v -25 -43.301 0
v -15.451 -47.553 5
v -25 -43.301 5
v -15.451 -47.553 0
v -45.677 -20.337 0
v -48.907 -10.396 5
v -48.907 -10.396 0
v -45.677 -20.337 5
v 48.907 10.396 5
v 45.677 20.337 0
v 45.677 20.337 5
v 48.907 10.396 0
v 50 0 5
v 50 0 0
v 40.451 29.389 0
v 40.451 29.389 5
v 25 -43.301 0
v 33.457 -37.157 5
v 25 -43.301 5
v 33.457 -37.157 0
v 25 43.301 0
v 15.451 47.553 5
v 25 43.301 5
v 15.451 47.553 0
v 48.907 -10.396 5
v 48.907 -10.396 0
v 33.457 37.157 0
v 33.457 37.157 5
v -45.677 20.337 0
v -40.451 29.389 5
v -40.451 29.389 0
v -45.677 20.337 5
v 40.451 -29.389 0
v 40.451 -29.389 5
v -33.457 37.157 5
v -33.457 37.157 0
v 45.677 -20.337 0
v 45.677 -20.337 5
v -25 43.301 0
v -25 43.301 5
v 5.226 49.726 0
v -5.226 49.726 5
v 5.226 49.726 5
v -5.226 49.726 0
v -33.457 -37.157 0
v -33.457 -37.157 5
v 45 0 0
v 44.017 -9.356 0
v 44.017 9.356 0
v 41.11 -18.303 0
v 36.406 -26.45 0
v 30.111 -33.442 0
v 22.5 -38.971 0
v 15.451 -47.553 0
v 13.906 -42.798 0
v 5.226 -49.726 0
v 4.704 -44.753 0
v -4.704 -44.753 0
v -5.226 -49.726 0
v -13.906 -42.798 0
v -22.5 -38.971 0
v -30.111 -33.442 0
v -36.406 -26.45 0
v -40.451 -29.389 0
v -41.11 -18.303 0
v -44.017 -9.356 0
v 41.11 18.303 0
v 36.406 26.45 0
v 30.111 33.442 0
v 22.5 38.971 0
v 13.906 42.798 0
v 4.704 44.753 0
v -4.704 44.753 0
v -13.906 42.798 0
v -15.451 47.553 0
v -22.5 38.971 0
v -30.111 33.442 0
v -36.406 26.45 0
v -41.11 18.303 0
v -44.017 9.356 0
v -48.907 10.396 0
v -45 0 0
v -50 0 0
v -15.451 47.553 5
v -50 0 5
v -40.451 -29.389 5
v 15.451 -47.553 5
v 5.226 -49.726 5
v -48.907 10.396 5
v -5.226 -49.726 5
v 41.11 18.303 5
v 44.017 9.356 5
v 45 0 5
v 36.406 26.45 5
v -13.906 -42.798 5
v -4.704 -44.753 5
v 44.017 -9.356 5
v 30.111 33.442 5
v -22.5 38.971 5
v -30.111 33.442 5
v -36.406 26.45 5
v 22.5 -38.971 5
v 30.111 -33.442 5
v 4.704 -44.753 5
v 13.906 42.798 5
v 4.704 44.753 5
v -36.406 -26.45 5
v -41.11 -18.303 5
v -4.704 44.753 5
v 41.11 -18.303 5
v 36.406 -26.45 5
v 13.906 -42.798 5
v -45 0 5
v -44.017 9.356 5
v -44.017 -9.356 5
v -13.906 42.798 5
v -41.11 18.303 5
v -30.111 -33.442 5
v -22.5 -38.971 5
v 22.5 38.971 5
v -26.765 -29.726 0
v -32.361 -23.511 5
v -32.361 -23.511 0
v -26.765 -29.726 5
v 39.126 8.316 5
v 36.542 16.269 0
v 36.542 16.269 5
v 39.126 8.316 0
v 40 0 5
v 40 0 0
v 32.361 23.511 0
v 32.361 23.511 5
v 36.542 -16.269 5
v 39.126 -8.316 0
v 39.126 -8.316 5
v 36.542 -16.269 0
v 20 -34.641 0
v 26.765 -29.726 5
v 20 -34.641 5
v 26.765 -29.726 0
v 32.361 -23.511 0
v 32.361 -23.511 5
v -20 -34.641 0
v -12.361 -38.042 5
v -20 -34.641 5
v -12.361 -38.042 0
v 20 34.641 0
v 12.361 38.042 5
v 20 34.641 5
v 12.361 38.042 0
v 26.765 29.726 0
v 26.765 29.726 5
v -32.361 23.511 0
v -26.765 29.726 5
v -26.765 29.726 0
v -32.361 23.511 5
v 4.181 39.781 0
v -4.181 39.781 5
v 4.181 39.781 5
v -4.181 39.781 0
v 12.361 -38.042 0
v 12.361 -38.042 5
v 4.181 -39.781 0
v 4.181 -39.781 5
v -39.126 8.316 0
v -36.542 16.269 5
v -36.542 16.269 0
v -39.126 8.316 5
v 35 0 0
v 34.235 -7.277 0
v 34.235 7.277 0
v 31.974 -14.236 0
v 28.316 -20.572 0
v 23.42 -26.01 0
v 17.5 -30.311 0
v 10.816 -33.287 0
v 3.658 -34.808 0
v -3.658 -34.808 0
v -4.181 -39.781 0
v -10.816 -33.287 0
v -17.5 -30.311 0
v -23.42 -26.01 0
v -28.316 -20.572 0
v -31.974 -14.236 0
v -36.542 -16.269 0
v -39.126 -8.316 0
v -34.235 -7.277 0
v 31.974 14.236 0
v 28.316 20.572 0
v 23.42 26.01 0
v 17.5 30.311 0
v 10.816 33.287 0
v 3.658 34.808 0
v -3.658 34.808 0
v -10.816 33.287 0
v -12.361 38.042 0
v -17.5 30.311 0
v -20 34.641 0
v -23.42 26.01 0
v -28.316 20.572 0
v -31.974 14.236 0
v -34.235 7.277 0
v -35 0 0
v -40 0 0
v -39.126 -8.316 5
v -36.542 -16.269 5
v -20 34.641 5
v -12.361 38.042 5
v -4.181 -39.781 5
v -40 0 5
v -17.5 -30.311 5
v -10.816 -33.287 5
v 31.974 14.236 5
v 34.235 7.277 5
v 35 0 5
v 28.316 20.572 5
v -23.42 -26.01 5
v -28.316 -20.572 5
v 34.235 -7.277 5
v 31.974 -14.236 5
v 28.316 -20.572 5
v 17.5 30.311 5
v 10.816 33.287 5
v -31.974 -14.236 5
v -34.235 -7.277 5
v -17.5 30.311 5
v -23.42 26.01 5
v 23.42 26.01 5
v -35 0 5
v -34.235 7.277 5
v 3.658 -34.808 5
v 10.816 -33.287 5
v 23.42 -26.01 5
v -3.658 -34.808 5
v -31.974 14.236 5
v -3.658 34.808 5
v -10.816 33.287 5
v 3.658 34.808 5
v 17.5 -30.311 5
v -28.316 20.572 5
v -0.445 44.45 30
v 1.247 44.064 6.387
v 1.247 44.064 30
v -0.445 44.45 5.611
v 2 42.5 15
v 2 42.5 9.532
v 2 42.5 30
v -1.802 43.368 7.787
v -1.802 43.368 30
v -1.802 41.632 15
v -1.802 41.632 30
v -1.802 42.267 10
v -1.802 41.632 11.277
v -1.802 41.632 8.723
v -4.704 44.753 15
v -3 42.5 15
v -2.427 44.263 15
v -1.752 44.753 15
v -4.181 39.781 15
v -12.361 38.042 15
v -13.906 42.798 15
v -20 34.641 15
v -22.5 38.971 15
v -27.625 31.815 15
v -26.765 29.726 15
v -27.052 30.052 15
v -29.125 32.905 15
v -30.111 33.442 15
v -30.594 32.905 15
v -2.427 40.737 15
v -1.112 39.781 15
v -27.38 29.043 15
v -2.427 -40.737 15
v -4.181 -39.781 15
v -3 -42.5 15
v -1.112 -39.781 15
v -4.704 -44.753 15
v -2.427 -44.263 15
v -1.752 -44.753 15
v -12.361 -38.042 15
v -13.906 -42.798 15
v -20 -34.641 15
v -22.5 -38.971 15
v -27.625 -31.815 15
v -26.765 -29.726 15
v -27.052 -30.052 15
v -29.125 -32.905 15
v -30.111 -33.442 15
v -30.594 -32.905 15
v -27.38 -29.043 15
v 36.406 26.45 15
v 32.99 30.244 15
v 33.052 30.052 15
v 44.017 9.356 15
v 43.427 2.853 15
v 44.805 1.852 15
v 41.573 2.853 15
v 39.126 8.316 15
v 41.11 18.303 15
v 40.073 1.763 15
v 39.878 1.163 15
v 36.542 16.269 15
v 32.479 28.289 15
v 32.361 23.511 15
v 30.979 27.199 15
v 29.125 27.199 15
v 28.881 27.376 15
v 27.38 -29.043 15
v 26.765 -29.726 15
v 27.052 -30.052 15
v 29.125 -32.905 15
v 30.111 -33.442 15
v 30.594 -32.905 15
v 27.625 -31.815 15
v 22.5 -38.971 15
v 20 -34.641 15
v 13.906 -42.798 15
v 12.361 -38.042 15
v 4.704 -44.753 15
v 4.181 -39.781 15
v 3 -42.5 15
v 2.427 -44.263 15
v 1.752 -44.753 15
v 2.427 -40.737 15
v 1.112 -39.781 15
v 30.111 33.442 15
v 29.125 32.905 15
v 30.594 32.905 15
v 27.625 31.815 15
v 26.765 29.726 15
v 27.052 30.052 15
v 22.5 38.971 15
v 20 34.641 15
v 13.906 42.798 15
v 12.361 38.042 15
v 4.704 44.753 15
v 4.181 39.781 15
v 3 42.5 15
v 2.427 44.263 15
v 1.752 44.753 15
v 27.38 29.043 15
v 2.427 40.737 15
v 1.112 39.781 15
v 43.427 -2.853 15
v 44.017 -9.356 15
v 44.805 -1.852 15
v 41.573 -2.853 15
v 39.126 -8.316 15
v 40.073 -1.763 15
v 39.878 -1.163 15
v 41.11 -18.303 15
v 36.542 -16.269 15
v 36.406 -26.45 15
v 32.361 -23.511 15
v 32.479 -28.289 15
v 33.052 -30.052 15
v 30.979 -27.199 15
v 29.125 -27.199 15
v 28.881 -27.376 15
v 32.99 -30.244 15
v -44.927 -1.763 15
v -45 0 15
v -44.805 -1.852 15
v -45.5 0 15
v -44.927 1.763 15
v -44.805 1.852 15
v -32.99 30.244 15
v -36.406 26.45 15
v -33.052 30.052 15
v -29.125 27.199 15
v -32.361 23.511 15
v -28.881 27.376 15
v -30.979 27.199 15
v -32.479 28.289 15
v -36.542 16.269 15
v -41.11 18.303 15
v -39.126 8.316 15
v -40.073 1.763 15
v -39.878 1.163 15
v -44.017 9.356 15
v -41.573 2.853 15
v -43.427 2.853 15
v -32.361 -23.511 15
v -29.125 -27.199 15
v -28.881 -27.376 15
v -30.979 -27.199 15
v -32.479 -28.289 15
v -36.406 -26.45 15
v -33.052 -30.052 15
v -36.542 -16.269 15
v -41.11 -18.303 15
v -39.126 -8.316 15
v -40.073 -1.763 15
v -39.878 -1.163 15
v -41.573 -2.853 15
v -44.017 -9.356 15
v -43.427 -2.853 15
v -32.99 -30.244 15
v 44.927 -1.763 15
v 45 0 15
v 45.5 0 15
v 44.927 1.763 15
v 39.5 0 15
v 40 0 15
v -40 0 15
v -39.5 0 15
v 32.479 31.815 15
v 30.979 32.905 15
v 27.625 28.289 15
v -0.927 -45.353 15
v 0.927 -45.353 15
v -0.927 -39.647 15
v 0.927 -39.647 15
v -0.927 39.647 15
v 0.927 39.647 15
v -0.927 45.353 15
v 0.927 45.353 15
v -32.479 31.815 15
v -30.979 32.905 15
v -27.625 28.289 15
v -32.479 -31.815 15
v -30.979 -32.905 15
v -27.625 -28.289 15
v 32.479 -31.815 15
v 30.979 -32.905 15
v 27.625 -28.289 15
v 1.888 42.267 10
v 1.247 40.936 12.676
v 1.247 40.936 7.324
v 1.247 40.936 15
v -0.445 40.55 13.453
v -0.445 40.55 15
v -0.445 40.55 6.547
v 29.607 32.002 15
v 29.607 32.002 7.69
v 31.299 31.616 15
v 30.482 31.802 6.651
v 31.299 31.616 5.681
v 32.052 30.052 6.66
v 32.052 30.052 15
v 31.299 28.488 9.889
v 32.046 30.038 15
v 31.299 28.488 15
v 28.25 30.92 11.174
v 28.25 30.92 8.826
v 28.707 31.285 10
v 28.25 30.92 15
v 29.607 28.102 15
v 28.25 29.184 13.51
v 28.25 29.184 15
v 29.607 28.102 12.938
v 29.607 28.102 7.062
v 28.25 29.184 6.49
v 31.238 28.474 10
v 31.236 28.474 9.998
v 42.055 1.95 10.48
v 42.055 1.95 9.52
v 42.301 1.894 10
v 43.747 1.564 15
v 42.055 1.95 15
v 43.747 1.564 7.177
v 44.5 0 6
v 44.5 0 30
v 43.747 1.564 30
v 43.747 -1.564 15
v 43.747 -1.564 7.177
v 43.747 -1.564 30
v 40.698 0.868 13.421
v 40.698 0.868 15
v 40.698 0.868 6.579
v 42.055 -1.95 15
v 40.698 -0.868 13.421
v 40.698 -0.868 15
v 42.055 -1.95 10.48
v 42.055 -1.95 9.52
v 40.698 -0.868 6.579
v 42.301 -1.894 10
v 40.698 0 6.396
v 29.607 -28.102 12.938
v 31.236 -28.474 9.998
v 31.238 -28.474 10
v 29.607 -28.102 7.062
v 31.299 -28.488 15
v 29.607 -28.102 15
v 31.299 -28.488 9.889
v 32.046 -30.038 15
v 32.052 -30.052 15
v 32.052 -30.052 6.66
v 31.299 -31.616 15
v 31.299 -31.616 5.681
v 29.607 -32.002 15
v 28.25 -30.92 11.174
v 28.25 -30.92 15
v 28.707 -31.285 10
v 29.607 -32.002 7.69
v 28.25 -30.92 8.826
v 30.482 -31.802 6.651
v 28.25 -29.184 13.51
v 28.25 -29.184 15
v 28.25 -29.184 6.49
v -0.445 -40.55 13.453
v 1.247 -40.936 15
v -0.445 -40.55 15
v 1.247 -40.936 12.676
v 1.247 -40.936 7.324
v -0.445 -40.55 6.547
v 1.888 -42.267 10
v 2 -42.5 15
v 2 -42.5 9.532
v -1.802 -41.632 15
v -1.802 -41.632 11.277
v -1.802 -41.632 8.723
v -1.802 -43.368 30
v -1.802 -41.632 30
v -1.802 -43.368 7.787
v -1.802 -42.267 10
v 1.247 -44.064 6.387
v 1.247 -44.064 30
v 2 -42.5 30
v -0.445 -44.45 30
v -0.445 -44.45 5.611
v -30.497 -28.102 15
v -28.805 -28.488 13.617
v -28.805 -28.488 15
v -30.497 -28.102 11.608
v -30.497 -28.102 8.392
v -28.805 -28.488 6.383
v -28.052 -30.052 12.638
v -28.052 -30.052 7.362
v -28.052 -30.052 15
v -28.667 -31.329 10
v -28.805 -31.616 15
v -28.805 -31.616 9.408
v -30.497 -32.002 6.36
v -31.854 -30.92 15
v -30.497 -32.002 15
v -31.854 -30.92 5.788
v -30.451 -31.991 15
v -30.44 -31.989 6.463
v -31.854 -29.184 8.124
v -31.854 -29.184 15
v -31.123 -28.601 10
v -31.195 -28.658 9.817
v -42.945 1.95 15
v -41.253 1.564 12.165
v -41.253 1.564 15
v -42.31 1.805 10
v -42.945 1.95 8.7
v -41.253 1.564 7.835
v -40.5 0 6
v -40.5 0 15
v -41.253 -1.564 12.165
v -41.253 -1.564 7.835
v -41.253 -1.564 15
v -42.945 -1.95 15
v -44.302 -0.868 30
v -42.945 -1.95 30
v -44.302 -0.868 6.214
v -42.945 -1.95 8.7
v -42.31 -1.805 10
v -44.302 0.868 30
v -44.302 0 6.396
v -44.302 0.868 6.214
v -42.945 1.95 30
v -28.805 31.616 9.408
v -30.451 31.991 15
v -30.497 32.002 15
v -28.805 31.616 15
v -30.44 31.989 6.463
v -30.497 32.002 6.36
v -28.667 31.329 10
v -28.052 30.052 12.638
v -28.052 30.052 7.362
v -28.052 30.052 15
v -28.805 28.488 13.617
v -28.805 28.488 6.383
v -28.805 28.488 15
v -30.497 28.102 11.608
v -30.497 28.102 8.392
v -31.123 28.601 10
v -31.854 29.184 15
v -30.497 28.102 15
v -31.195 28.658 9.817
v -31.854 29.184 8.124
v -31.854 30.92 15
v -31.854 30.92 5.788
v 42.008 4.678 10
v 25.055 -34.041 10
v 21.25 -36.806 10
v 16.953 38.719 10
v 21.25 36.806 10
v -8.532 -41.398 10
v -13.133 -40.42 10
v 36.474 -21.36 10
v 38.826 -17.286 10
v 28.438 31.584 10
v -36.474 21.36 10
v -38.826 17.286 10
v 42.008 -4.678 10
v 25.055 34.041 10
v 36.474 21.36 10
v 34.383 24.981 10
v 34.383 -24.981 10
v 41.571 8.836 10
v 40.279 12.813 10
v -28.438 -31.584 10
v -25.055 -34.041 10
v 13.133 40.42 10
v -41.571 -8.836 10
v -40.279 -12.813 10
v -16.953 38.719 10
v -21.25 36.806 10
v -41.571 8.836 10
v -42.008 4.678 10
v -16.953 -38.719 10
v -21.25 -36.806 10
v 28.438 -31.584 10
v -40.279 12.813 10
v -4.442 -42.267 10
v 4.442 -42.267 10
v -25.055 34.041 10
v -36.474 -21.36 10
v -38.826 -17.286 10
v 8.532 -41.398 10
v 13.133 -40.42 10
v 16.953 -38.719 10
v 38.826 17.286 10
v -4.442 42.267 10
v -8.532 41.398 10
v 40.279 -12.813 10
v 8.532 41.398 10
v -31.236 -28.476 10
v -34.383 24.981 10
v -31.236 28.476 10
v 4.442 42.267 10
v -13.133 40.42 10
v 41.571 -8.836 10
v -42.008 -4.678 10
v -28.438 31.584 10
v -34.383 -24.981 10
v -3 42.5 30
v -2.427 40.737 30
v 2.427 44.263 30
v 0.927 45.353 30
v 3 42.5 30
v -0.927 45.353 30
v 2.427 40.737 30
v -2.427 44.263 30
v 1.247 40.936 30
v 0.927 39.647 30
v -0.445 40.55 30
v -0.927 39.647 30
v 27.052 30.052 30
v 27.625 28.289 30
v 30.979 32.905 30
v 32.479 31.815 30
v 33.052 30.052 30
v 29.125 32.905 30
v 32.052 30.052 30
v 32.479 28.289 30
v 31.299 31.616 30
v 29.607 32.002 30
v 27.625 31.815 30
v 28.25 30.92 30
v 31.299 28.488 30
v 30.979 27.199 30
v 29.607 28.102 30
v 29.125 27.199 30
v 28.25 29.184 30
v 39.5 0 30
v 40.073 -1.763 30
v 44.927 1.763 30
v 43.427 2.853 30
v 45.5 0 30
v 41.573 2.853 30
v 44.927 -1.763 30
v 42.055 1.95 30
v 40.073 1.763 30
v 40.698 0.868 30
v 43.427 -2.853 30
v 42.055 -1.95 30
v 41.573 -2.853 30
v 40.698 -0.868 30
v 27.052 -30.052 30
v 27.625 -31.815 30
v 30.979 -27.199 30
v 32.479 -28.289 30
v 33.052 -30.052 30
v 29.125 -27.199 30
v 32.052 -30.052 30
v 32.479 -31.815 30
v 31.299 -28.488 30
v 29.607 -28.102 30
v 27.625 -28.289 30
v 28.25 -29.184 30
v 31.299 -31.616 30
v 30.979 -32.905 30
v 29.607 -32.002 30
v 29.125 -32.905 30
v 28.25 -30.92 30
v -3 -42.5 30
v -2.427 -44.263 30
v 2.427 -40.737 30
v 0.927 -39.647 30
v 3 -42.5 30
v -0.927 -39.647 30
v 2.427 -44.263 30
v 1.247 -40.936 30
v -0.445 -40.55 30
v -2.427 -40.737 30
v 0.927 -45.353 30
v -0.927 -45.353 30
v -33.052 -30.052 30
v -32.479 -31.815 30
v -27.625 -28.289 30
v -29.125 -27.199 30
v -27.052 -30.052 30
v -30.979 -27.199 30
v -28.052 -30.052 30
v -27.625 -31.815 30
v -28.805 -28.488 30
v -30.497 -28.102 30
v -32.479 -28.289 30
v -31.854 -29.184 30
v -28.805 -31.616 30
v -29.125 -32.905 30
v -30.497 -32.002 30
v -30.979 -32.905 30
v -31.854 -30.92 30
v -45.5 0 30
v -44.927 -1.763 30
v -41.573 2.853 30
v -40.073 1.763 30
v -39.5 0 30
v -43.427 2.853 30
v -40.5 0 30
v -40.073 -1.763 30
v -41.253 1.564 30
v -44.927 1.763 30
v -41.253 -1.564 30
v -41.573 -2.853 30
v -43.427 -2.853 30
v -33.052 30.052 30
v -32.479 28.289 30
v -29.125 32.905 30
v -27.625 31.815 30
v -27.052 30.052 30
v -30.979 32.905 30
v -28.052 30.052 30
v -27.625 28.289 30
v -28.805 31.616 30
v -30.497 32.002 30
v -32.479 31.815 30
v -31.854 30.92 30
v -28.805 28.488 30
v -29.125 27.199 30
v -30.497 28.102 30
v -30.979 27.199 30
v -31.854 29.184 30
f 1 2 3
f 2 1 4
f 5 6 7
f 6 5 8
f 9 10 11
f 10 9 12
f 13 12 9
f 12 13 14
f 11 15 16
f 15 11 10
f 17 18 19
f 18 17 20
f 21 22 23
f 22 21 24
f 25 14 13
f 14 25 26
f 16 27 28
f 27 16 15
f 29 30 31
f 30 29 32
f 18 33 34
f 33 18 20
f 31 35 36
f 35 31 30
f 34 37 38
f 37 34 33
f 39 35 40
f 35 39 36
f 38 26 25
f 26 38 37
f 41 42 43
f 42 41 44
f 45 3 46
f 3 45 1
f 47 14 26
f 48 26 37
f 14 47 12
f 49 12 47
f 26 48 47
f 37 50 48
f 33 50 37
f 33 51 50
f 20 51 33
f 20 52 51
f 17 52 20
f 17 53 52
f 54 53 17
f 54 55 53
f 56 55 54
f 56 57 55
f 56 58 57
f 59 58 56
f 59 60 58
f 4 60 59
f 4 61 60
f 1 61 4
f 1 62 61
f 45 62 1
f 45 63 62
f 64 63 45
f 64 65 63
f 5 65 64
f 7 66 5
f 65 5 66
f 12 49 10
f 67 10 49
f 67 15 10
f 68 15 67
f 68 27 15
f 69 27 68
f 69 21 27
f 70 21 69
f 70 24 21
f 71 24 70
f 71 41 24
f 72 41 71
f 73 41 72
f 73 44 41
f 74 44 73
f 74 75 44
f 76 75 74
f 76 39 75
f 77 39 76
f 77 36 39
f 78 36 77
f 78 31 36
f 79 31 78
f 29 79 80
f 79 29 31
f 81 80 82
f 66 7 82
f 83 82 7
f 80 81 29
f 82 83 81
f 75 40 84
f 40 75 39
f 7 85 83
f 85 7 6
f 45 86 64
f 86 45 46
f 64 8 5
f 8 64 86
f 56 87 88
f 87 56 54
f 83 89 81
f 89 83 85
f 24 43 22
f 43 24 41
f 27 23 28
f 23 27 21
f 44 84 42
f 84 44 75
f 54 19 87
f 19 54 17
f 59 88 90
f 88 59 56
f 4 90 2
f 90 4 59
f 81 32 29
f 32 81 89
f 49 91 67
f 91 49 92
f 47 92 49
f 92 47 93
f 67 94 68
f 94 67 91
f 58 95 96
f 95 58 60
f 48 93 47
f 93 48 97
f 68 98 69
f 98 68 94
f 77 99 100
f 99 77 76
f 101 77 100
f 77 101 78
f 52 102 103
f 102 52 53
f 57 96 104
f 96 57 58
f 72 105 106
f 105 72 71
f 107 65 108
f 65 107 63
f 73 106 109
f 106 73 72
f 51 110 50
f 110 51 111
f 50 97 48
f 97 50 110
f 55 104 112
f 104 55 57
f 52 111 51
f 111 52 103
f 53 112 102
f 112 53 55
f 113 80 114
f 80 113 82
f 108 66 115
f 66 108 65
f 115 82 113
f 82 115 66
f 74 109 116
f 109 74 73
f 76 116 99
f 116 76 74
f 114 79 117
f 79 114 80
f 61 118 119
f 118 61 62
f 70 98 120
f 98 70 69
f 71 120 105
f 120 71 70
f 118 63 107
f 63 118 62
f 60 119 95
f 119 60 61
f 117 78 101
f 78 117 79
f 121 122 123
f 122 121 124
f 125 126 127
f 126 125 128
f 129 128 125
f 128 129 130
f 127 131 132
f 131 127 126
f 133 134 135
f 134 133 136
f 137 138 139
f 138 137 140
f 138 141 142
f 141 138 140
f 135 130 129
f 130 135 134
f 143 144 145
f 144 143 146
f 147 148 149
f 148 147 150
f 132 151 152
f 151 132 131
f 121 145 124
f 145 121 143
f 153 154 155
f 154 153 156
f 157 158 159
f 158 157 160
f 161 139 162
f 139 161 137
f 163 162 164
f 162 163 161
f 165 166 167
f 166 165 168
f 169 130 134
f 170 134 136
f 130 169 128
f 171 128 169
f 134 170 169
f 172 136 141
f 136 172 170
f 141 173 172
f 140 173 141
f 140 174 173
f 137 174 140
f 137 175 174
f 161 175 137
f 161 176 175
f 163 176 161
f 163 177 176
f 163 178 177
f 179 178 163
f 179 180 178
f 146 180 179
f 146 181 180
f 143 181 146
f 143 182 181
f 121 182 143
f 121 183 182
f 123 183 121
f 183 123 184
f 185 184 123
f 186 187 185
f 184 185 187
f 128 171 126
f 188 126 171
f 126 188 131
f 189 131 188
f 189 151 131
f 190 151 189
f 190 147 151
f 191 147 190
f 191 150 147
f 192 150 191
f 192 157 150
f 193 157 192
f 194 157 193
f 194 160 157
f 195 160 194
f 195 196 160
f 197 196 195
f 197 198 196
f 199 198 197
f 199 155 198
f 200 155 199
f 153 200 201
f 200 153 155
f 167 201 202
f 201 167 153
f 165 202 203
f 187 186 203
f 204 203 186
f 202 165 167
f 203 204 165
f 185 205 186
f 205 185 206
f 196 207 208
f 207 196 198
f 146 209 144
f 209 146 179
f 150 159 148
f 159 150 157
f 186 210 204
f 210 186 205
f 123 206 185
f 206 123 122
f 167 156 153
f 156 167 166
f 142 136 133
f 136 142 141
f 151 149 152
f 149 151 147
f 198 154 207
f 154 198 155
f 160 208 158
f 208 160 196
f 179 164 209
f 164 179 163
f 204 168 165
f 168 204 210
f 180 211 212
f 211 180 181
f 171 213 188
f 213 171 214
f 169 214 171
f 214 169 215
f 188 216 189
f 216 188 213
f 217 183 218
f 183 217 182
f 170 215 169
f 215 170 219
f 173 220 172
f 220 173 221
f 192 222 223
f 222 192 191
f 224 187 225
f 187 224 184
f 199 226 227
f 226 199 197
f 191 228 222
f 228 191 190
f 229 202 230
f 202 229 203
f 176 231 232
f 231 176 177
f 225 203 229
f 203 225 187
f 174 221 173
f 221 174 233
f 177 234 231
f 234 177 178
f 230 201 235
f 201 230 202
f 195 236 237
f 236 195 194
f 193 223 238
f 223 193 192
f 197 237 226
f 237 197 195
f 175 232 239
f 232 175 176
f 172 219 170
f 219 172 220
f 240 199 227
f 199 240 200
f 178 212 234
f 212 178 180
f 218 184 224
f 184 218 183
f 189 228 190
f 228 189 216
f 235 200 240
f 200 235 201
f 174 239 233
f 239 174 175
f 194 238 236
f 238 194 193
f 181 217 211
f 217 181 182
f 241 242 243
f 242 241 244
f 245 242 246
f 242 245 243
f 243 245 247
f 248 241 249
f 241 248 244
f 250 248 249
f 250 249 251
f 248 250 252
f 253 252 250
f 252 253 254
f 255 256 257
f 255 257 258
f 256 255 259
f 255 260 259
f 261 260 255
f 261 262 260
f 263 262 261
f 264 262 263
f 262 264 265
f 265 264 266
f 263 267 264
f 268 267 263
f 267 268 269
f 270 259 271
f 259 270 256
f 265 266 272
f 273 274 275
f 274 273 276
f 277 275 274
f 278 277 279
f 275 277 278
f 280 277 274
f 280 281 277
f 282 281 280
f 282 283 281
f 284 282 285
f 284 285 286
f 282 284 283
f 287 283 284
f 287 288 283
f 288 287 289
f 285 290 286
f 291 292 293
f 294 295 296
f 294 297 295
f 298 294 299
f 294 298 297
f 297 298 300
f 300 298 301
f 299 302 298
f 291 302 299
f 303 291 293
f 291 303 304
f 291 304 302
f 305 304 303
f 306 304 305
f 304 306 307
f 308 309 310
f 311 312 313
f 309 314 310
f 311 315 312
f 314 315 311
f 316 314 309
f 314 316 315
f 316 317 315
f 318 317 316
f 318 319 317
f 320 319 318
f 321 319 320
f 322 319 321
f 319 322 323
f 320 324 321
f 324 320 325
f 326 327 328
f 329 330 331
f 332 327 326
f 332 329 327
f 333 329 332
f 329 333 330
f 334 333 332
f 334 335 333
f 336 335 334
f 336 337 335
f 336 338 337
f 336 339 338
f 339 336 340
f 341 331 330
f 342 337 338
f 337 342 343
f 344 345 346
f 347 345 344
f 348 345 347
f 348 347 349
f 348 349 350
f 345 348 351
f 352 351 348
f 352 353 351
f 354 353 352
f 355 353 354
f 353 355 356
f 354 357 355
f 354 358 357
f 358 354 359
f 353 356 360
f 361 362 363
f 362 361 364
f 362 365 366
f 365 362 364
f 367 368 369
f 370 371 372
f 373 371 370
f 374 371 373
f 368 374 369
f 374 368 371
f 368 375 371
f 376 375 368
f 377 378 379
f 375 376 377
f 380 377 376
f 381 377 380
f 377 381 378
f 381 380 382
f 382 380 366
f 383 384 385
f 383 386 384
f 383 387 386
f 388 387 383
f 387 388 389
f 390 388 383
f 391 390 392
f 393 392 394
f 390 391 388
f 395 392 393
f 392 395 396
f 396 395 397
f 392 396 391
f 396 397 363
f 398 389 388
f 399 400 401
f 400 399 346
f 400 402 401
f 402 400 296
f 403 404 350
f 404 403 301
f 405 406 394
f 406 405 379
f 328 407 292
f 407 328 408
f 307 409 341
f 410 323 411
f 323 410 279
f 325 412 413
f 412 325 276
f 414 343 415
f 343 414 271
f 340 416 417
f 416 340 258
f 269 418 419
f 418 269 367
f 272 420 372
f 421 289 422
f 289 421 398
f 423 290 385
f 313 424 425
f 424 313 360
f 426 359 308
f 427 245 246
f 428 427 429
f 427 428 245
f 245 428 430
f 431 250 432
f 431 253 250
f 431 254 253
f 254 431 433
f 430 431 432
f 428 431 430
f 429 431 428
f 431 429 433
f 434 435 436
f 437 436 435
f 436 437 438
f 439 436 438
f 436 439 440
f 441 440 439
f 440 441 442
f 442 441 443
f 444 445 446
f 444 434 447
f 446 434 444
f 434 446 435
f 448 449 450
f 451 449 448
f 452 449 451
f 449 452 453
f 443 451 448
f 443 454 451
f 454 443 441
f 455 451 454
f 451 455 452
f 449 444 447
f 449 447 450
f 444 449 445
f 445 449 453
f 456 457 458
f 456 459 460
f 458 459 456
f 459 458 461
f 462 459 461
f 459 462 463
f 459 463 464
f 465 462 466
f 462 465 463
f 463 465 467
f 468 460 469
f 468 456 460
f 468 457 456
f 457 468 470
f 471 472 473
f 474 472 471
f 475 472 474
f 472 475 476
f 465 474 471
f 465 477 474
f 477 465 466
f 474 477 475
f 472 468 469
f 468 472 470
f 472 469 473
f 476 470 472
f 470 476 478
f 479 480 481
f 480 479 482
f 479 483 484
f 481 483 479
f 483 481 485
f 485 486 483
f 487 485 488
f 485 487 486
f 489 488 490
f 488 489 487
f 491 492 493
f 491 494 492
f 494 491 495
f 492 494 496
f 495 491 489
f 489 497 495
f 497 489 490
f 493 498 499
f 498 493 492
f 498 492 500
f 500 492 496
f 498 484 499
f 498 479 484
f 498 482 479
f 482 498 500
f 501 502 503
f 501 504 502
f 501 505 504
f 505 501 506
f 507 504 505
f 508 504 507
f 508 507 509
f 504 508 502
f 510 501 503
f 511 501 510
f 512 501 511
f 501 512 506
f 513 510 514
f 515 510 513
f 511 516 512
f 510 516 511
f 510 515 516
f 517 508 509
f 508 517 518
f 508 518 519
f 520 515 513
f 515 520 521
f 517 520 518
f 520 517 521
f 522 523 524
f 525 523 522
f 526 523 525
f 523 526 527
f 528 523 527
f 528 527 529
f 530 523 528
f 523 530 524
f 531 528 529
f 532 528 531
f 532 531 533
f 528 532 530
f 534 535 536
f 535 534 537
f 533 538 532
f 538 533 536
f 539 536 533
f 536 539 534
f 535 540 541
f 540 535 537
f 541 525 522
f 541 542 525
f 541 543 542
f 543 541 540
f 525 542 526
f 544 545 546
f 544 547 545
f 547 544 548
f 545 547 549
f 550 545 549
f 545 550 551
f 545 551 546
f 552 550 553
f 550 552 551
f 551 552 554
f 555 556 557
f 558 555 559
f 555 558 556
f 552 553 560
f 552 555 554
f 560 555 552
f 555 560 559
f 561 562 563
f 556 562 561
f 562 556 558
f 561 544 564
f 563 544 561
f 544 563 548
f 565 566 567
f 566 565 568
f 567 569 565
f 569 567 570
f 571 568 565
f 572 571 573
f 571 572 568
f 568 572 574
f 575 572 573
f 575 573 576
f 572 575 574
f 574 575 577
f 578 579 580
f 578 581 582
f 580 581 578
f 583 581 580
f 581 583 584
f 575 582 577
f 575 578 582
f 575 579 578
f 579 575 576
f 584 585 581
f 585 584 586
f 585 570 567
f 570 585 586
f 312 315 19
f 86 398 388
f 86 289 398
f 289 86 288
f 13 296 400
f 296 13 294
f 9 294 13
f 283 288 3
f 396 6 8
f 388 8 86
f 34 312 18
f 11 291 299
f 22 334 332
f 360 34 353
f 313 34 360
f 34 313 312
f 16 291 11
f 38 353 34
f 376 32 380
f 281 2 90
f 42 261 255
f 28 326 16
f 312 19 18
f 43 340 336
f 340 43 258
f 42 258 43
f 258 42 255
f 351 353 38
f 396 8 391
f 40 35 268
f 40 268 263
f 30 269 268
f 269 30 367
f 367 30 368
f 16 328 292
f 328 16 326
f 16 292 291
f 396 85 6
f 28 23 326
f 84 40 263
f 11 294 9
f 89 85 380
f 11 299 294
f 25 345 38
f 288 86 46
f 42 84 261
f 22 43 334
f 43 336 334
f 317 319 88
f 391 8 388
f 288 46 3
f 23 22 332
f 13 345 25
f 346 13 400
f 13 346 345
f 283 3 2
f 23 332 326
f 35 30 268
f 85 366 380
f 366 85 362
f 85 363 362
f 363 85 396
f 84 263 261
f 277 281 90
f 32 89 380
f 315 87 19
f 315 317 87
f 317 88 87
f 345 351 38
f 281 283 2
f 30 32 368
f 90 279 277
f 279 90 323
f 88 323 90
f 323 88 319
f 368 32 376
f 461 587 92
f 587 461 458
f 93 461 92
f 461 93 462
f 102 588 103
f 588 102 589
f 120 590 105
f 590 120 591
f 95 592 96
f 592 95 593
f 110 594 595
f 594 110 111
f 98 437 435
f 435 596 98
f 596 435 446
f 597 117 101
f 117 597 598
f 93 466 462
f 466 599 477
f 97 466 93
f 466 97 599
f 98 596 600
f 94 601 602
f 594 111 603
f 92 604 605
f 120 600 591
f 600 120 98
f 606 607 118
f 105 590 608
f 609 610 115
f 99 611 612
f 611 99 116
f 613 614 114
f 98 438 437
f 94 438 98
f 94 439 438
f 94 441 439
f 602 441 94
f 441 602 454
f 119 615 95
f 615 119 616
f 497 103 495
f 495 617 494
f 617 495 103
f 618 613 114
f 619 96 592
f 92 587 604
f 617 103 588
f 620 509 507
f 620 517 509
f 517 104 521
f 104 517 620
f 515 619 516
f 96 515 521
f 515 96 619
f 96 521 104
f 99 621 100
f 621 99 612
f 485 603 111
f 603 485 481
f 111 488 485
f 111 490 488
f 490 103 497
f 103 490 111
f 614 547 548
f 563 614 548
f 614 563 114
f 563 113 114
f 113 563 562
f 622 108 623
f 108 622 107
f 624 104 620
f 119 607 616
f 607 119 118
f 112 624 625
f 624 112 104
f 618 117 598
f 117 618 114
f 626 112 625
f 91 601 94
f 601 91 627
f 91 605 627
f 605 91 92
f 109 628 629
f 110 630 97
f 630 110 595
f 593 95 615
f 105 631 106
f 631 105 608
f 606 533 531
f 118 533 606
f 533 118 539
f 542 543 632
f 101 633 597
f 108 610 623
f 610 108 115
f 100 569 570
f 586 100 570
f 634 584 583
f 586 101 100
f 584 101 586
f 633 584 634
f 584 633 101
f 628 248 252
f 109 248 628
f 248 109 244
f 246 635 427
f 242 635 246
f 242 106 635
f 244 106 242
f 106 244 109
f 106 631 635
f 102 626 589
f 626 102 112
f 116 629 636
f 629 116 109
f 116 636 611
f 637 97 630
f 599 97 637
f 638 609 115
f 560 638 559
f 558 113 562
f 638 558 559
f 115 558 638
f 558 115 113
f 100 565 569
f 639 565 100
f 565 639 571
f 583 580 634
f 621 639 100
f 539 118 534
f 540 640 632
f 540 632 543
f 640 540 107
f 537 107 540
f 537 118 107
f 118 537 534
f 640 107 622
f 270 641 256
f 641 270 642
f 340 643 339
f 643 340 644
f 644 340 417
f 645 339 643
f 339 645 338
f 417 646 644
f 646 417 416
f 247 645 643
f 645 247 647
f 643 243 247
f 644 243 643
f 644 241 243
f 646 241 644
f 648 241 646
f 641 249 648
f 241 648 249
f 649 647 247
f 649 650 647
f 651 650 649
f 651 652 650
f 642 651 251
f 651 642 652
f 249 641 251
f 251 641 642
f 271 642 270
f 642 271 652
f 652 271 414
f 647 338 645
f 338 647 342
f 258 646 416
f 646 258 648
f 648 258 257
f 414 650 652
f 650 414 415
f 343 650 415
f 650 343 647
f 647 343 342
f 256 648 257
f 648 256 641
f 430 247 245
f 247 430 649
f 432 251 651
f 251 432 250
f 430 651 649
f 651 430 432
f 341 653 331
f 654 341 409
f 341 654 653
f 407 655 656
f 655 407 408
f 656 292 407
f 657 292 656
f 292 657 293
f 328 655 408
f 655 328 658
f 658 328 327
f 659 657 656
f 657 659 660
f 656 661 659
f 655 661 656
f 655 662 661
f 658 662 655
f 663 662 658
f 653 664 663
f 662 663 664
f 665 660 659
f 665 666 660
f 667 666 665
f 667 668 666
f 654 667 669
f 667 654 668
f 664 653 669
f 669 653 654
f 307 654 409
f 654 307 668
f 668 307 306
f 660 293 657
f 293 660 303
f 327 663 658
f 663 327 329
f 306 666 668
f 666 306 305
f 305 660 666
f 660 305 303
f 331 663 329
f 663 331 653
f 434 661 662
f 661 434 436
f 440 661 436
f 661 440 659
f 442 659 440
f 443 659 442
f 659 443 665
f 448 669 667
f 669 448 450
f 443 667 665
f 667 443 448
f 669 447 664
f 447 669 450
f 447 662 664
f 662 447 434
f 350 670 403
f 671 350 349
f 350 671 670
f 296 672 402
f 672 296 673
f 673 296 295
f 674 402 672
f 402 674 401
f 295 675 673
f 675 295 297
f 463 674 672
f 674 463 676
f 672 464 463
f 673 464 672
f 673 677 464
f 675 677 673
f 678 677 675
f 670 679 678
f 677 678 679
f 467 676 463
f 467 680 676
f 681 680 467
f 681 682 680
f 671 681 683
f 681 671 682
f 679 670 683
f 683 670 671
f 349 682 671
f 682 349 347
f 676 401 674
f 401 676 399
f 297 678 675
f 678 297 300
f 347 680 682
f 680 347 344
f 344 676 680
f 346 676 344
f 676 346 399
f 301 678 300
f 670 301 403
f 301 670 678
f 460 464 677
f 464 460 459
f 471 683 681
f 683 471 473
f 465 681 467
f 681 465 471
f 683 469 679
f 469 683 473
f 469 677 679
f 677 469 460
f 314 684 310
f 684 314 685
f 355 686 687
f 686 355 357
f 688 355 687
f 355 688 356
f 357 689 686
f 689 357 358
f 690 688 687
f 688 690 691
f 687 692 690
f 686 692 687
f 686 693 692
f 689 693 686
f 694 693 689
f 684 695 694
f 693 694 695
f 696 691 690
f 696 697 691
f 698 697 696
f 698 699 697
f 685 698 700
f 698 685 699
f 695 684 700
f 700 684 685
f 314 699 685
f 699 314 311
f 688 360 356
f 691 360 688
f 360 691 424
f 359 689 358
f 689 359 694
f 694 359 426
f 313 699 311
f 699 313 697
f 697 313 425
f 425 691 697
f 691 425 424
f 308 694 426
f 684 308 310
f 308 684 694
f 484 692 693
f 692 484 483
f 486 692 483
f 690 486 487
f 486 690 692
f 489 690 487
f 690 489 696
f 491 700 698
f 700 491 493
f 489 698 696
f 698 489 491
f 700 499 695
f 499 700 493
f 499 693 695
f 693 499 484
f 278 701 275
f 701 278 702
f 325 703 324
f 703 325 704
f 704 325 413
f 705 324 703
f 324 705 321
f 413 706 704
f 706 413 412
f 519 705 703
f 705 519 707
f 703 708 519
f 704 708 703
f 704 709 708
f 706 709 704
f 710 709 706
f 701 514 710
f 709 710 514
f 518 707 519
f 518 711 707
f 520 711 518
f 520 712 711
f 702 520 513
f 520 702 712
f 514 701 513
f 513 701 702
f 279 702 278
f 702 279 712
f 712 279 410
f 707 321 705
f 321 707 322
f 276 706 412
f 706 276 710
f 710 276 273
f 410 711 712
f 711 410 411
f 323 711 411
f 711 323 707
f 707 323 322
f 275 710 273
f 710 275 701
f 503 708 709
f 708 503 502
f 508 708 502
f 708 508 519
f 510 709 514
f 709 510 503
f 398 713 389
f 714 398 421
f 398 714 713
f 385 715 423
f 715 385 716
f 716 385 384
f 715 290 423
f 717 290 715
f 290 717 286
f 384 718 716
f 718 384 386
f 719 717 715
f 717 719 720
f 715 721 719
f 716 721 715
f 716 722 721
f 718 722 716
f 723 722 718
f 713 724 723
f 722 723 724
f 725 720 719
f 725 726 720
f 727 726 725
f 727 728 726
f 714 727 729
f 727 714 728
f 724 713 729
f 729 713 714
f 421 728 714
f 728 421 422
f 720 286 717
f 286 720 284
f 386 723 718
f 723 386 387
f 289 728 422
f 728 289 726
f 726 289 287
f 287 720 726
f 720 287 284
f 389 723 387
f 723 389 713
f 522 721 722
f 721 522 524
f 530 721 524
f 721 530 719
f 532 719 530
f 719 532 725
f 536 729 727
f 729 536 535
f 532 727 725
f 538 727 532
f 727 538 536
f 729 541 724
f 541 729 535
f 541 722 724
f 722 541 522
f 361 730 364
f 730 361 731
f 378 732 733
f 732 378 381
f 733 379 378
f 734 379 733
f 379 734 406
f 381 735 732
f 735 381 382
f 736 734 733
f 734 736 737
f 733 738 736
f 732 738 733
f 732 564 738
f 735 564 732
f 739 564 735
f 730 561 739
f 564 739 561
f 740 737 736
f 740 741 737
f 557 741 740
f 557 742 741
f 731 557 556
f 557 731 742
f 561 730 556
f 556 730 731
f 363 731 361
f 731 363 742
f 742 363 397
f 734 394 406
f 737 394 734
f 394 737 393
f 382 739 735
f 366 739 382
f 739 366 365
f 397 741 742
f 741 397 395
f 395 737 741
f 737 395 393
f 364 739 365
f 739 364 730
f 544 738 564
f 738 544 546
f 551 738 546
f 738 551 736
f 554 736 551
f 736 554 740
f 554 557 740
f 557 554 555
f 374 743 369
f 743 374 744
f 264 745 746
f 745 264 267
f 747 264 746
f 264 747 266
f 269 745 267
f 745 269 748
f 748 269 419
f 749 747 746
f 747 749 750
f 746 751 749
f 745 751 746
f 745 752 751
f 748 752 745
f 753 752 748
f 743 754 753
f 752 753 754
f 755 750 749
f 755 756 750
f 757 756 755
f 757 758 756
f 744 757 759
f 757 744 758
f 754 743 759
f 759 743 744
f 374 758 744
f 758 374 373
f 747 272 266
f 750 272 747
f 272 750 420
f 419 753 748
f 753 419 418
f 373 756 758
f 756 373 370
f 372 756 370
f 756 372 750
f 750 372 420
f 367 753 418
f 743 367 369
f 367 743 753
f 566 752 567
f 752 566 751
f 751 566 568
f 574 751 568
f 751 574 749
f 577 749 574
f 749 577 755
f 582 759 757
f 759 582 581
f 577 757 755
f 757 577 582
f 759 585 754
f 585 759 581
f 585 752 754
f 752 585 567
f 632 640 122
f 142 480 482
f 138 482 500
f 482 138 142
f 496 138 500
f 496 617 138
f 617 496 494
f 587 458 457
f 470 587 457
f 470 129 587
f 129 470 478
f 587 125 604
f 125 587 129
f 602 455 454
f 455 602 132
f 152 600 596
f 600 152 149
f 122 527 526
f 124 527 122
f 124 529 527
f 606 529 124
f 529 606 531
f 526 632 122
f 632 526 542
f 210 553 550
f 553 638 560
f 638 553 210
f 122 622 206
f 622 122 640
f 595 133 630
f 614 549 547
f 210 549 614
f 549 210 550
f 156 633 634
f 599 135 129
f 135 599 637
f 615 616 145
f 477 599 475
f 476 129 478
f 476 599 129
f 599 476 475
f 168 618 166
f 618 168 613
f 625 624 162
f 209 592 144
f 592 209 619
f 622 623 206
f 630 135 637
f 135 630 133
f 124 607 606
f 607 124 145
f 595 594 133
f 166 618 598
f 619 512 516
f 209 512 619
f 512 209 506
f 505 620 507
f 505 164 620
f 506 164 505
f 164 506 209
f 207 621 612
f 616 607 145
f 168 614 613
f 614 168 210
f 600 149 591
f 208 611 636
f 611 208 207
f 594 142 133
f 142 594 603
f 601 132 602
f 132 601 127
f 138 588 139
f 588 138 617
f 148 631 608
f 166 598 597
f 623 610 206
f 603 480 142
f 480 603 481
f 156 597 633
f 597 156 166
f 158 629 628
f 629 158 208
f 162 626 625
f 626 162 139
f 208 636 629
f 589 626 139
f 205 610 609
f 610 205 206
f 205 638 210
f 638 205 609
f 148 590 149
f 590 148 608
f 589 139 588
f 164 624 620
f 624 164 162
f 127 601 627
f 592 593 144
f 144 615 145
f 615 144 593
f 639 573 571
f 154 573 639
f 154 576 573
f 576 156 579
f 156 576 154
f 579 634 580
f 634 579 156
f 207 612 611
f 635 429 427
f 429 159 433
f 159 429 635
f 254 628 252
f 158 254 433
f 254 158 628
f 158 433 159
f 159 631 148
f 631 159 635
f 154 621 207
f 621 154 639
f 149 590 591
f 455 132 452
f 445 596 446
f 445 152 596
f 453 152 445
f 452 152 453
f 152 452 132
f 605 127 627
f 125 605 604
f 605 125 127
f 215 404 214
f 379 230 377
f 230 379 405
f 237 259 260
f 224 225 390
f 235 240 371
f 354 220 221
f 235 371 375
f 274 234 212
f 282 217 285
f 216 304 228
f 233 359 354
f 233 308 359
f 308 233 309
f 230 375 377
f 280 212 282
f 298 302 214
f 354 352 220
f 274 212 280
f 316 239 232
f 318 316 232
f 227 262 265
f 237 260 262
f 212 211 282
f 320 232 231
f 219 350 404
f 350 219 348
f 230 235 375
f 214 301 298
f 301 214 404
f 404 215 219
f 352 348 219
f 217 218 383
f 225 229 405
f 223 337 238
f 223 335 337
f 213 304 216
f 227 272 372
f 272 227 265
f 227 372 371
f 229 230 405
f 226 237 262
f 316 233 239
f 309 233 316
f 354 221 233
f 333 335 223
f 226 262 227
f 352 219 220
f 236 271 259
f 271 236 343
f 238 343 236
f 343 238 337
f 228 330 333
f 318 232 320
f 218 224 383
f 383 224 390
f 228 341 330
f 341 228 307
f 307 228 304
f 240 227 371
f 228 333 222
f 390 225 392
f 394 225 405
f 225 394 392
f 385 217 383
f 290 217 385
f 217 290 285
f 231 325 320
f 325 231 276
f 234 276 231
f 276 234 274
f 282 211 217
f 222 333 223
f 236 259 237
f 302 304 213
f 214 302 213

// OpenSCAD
pinoepel = 8;
radius = 50;
thickness = 5;
holes = radius - (1.5 * thickness);

difference() {
	cylinder(5, r=radius);
	cylinder(5, r=radius-thickness);
}

difference() {
	cylinder(5, r=radius - (2 * thickness));
	cylinder(5, r=radius - (3 * thickness));
}

translate([0,0,5]) {
difference() {
	cylinder(10, r1=radius, r2=radius-thickness);
	cylinder(10, r1=radius-thickness, r2=radius-(2 * thickness));
	for (z = [0:pinoepel]) {
		translate([sin(z * 360/pinoepel)*holes, cos(z * 360/pinoepel)*holes, 0]) {
				cylinder(10, r=2);
		}
	}
}

translate([0,0,8]) {
	difference() {
		cylinder(2, r=radius-thickness);
		cylinder(2, r=radius-(2*thickness));
		for (z = [0:pinoepel]) {
			translate([sin(z * 360/pinoepel)*holes, cos(z * 360/pinoepel)*holes, 0]){
				cylinder(2, r=2);
			}
		}
	}
}

for (z = [0:pinoepel]) {
	translate([sin(z * 360/pinoepel)*holes, cos(z * 360/pinoepel)*holes, 10]) {
		difference() {
			cylinder(15, r=3);
			cylinder(15, r=2);
		}
	}
}

difference() {
	cylinder(10, r1=radius-(2 * thickness), r2=radius-(1 * thickness));
	cylinder(10, r1=radius-(3 * thickness), r2=radius-(2 * thickness));
	for (z = [0:pinoepel]) {
		translate([sin(z * 360/pinoepel)*holes, cos(z * 360/pinoepel)*holes, 0]) {
				cylinder(10, r=2);
		}
	}
}
}
